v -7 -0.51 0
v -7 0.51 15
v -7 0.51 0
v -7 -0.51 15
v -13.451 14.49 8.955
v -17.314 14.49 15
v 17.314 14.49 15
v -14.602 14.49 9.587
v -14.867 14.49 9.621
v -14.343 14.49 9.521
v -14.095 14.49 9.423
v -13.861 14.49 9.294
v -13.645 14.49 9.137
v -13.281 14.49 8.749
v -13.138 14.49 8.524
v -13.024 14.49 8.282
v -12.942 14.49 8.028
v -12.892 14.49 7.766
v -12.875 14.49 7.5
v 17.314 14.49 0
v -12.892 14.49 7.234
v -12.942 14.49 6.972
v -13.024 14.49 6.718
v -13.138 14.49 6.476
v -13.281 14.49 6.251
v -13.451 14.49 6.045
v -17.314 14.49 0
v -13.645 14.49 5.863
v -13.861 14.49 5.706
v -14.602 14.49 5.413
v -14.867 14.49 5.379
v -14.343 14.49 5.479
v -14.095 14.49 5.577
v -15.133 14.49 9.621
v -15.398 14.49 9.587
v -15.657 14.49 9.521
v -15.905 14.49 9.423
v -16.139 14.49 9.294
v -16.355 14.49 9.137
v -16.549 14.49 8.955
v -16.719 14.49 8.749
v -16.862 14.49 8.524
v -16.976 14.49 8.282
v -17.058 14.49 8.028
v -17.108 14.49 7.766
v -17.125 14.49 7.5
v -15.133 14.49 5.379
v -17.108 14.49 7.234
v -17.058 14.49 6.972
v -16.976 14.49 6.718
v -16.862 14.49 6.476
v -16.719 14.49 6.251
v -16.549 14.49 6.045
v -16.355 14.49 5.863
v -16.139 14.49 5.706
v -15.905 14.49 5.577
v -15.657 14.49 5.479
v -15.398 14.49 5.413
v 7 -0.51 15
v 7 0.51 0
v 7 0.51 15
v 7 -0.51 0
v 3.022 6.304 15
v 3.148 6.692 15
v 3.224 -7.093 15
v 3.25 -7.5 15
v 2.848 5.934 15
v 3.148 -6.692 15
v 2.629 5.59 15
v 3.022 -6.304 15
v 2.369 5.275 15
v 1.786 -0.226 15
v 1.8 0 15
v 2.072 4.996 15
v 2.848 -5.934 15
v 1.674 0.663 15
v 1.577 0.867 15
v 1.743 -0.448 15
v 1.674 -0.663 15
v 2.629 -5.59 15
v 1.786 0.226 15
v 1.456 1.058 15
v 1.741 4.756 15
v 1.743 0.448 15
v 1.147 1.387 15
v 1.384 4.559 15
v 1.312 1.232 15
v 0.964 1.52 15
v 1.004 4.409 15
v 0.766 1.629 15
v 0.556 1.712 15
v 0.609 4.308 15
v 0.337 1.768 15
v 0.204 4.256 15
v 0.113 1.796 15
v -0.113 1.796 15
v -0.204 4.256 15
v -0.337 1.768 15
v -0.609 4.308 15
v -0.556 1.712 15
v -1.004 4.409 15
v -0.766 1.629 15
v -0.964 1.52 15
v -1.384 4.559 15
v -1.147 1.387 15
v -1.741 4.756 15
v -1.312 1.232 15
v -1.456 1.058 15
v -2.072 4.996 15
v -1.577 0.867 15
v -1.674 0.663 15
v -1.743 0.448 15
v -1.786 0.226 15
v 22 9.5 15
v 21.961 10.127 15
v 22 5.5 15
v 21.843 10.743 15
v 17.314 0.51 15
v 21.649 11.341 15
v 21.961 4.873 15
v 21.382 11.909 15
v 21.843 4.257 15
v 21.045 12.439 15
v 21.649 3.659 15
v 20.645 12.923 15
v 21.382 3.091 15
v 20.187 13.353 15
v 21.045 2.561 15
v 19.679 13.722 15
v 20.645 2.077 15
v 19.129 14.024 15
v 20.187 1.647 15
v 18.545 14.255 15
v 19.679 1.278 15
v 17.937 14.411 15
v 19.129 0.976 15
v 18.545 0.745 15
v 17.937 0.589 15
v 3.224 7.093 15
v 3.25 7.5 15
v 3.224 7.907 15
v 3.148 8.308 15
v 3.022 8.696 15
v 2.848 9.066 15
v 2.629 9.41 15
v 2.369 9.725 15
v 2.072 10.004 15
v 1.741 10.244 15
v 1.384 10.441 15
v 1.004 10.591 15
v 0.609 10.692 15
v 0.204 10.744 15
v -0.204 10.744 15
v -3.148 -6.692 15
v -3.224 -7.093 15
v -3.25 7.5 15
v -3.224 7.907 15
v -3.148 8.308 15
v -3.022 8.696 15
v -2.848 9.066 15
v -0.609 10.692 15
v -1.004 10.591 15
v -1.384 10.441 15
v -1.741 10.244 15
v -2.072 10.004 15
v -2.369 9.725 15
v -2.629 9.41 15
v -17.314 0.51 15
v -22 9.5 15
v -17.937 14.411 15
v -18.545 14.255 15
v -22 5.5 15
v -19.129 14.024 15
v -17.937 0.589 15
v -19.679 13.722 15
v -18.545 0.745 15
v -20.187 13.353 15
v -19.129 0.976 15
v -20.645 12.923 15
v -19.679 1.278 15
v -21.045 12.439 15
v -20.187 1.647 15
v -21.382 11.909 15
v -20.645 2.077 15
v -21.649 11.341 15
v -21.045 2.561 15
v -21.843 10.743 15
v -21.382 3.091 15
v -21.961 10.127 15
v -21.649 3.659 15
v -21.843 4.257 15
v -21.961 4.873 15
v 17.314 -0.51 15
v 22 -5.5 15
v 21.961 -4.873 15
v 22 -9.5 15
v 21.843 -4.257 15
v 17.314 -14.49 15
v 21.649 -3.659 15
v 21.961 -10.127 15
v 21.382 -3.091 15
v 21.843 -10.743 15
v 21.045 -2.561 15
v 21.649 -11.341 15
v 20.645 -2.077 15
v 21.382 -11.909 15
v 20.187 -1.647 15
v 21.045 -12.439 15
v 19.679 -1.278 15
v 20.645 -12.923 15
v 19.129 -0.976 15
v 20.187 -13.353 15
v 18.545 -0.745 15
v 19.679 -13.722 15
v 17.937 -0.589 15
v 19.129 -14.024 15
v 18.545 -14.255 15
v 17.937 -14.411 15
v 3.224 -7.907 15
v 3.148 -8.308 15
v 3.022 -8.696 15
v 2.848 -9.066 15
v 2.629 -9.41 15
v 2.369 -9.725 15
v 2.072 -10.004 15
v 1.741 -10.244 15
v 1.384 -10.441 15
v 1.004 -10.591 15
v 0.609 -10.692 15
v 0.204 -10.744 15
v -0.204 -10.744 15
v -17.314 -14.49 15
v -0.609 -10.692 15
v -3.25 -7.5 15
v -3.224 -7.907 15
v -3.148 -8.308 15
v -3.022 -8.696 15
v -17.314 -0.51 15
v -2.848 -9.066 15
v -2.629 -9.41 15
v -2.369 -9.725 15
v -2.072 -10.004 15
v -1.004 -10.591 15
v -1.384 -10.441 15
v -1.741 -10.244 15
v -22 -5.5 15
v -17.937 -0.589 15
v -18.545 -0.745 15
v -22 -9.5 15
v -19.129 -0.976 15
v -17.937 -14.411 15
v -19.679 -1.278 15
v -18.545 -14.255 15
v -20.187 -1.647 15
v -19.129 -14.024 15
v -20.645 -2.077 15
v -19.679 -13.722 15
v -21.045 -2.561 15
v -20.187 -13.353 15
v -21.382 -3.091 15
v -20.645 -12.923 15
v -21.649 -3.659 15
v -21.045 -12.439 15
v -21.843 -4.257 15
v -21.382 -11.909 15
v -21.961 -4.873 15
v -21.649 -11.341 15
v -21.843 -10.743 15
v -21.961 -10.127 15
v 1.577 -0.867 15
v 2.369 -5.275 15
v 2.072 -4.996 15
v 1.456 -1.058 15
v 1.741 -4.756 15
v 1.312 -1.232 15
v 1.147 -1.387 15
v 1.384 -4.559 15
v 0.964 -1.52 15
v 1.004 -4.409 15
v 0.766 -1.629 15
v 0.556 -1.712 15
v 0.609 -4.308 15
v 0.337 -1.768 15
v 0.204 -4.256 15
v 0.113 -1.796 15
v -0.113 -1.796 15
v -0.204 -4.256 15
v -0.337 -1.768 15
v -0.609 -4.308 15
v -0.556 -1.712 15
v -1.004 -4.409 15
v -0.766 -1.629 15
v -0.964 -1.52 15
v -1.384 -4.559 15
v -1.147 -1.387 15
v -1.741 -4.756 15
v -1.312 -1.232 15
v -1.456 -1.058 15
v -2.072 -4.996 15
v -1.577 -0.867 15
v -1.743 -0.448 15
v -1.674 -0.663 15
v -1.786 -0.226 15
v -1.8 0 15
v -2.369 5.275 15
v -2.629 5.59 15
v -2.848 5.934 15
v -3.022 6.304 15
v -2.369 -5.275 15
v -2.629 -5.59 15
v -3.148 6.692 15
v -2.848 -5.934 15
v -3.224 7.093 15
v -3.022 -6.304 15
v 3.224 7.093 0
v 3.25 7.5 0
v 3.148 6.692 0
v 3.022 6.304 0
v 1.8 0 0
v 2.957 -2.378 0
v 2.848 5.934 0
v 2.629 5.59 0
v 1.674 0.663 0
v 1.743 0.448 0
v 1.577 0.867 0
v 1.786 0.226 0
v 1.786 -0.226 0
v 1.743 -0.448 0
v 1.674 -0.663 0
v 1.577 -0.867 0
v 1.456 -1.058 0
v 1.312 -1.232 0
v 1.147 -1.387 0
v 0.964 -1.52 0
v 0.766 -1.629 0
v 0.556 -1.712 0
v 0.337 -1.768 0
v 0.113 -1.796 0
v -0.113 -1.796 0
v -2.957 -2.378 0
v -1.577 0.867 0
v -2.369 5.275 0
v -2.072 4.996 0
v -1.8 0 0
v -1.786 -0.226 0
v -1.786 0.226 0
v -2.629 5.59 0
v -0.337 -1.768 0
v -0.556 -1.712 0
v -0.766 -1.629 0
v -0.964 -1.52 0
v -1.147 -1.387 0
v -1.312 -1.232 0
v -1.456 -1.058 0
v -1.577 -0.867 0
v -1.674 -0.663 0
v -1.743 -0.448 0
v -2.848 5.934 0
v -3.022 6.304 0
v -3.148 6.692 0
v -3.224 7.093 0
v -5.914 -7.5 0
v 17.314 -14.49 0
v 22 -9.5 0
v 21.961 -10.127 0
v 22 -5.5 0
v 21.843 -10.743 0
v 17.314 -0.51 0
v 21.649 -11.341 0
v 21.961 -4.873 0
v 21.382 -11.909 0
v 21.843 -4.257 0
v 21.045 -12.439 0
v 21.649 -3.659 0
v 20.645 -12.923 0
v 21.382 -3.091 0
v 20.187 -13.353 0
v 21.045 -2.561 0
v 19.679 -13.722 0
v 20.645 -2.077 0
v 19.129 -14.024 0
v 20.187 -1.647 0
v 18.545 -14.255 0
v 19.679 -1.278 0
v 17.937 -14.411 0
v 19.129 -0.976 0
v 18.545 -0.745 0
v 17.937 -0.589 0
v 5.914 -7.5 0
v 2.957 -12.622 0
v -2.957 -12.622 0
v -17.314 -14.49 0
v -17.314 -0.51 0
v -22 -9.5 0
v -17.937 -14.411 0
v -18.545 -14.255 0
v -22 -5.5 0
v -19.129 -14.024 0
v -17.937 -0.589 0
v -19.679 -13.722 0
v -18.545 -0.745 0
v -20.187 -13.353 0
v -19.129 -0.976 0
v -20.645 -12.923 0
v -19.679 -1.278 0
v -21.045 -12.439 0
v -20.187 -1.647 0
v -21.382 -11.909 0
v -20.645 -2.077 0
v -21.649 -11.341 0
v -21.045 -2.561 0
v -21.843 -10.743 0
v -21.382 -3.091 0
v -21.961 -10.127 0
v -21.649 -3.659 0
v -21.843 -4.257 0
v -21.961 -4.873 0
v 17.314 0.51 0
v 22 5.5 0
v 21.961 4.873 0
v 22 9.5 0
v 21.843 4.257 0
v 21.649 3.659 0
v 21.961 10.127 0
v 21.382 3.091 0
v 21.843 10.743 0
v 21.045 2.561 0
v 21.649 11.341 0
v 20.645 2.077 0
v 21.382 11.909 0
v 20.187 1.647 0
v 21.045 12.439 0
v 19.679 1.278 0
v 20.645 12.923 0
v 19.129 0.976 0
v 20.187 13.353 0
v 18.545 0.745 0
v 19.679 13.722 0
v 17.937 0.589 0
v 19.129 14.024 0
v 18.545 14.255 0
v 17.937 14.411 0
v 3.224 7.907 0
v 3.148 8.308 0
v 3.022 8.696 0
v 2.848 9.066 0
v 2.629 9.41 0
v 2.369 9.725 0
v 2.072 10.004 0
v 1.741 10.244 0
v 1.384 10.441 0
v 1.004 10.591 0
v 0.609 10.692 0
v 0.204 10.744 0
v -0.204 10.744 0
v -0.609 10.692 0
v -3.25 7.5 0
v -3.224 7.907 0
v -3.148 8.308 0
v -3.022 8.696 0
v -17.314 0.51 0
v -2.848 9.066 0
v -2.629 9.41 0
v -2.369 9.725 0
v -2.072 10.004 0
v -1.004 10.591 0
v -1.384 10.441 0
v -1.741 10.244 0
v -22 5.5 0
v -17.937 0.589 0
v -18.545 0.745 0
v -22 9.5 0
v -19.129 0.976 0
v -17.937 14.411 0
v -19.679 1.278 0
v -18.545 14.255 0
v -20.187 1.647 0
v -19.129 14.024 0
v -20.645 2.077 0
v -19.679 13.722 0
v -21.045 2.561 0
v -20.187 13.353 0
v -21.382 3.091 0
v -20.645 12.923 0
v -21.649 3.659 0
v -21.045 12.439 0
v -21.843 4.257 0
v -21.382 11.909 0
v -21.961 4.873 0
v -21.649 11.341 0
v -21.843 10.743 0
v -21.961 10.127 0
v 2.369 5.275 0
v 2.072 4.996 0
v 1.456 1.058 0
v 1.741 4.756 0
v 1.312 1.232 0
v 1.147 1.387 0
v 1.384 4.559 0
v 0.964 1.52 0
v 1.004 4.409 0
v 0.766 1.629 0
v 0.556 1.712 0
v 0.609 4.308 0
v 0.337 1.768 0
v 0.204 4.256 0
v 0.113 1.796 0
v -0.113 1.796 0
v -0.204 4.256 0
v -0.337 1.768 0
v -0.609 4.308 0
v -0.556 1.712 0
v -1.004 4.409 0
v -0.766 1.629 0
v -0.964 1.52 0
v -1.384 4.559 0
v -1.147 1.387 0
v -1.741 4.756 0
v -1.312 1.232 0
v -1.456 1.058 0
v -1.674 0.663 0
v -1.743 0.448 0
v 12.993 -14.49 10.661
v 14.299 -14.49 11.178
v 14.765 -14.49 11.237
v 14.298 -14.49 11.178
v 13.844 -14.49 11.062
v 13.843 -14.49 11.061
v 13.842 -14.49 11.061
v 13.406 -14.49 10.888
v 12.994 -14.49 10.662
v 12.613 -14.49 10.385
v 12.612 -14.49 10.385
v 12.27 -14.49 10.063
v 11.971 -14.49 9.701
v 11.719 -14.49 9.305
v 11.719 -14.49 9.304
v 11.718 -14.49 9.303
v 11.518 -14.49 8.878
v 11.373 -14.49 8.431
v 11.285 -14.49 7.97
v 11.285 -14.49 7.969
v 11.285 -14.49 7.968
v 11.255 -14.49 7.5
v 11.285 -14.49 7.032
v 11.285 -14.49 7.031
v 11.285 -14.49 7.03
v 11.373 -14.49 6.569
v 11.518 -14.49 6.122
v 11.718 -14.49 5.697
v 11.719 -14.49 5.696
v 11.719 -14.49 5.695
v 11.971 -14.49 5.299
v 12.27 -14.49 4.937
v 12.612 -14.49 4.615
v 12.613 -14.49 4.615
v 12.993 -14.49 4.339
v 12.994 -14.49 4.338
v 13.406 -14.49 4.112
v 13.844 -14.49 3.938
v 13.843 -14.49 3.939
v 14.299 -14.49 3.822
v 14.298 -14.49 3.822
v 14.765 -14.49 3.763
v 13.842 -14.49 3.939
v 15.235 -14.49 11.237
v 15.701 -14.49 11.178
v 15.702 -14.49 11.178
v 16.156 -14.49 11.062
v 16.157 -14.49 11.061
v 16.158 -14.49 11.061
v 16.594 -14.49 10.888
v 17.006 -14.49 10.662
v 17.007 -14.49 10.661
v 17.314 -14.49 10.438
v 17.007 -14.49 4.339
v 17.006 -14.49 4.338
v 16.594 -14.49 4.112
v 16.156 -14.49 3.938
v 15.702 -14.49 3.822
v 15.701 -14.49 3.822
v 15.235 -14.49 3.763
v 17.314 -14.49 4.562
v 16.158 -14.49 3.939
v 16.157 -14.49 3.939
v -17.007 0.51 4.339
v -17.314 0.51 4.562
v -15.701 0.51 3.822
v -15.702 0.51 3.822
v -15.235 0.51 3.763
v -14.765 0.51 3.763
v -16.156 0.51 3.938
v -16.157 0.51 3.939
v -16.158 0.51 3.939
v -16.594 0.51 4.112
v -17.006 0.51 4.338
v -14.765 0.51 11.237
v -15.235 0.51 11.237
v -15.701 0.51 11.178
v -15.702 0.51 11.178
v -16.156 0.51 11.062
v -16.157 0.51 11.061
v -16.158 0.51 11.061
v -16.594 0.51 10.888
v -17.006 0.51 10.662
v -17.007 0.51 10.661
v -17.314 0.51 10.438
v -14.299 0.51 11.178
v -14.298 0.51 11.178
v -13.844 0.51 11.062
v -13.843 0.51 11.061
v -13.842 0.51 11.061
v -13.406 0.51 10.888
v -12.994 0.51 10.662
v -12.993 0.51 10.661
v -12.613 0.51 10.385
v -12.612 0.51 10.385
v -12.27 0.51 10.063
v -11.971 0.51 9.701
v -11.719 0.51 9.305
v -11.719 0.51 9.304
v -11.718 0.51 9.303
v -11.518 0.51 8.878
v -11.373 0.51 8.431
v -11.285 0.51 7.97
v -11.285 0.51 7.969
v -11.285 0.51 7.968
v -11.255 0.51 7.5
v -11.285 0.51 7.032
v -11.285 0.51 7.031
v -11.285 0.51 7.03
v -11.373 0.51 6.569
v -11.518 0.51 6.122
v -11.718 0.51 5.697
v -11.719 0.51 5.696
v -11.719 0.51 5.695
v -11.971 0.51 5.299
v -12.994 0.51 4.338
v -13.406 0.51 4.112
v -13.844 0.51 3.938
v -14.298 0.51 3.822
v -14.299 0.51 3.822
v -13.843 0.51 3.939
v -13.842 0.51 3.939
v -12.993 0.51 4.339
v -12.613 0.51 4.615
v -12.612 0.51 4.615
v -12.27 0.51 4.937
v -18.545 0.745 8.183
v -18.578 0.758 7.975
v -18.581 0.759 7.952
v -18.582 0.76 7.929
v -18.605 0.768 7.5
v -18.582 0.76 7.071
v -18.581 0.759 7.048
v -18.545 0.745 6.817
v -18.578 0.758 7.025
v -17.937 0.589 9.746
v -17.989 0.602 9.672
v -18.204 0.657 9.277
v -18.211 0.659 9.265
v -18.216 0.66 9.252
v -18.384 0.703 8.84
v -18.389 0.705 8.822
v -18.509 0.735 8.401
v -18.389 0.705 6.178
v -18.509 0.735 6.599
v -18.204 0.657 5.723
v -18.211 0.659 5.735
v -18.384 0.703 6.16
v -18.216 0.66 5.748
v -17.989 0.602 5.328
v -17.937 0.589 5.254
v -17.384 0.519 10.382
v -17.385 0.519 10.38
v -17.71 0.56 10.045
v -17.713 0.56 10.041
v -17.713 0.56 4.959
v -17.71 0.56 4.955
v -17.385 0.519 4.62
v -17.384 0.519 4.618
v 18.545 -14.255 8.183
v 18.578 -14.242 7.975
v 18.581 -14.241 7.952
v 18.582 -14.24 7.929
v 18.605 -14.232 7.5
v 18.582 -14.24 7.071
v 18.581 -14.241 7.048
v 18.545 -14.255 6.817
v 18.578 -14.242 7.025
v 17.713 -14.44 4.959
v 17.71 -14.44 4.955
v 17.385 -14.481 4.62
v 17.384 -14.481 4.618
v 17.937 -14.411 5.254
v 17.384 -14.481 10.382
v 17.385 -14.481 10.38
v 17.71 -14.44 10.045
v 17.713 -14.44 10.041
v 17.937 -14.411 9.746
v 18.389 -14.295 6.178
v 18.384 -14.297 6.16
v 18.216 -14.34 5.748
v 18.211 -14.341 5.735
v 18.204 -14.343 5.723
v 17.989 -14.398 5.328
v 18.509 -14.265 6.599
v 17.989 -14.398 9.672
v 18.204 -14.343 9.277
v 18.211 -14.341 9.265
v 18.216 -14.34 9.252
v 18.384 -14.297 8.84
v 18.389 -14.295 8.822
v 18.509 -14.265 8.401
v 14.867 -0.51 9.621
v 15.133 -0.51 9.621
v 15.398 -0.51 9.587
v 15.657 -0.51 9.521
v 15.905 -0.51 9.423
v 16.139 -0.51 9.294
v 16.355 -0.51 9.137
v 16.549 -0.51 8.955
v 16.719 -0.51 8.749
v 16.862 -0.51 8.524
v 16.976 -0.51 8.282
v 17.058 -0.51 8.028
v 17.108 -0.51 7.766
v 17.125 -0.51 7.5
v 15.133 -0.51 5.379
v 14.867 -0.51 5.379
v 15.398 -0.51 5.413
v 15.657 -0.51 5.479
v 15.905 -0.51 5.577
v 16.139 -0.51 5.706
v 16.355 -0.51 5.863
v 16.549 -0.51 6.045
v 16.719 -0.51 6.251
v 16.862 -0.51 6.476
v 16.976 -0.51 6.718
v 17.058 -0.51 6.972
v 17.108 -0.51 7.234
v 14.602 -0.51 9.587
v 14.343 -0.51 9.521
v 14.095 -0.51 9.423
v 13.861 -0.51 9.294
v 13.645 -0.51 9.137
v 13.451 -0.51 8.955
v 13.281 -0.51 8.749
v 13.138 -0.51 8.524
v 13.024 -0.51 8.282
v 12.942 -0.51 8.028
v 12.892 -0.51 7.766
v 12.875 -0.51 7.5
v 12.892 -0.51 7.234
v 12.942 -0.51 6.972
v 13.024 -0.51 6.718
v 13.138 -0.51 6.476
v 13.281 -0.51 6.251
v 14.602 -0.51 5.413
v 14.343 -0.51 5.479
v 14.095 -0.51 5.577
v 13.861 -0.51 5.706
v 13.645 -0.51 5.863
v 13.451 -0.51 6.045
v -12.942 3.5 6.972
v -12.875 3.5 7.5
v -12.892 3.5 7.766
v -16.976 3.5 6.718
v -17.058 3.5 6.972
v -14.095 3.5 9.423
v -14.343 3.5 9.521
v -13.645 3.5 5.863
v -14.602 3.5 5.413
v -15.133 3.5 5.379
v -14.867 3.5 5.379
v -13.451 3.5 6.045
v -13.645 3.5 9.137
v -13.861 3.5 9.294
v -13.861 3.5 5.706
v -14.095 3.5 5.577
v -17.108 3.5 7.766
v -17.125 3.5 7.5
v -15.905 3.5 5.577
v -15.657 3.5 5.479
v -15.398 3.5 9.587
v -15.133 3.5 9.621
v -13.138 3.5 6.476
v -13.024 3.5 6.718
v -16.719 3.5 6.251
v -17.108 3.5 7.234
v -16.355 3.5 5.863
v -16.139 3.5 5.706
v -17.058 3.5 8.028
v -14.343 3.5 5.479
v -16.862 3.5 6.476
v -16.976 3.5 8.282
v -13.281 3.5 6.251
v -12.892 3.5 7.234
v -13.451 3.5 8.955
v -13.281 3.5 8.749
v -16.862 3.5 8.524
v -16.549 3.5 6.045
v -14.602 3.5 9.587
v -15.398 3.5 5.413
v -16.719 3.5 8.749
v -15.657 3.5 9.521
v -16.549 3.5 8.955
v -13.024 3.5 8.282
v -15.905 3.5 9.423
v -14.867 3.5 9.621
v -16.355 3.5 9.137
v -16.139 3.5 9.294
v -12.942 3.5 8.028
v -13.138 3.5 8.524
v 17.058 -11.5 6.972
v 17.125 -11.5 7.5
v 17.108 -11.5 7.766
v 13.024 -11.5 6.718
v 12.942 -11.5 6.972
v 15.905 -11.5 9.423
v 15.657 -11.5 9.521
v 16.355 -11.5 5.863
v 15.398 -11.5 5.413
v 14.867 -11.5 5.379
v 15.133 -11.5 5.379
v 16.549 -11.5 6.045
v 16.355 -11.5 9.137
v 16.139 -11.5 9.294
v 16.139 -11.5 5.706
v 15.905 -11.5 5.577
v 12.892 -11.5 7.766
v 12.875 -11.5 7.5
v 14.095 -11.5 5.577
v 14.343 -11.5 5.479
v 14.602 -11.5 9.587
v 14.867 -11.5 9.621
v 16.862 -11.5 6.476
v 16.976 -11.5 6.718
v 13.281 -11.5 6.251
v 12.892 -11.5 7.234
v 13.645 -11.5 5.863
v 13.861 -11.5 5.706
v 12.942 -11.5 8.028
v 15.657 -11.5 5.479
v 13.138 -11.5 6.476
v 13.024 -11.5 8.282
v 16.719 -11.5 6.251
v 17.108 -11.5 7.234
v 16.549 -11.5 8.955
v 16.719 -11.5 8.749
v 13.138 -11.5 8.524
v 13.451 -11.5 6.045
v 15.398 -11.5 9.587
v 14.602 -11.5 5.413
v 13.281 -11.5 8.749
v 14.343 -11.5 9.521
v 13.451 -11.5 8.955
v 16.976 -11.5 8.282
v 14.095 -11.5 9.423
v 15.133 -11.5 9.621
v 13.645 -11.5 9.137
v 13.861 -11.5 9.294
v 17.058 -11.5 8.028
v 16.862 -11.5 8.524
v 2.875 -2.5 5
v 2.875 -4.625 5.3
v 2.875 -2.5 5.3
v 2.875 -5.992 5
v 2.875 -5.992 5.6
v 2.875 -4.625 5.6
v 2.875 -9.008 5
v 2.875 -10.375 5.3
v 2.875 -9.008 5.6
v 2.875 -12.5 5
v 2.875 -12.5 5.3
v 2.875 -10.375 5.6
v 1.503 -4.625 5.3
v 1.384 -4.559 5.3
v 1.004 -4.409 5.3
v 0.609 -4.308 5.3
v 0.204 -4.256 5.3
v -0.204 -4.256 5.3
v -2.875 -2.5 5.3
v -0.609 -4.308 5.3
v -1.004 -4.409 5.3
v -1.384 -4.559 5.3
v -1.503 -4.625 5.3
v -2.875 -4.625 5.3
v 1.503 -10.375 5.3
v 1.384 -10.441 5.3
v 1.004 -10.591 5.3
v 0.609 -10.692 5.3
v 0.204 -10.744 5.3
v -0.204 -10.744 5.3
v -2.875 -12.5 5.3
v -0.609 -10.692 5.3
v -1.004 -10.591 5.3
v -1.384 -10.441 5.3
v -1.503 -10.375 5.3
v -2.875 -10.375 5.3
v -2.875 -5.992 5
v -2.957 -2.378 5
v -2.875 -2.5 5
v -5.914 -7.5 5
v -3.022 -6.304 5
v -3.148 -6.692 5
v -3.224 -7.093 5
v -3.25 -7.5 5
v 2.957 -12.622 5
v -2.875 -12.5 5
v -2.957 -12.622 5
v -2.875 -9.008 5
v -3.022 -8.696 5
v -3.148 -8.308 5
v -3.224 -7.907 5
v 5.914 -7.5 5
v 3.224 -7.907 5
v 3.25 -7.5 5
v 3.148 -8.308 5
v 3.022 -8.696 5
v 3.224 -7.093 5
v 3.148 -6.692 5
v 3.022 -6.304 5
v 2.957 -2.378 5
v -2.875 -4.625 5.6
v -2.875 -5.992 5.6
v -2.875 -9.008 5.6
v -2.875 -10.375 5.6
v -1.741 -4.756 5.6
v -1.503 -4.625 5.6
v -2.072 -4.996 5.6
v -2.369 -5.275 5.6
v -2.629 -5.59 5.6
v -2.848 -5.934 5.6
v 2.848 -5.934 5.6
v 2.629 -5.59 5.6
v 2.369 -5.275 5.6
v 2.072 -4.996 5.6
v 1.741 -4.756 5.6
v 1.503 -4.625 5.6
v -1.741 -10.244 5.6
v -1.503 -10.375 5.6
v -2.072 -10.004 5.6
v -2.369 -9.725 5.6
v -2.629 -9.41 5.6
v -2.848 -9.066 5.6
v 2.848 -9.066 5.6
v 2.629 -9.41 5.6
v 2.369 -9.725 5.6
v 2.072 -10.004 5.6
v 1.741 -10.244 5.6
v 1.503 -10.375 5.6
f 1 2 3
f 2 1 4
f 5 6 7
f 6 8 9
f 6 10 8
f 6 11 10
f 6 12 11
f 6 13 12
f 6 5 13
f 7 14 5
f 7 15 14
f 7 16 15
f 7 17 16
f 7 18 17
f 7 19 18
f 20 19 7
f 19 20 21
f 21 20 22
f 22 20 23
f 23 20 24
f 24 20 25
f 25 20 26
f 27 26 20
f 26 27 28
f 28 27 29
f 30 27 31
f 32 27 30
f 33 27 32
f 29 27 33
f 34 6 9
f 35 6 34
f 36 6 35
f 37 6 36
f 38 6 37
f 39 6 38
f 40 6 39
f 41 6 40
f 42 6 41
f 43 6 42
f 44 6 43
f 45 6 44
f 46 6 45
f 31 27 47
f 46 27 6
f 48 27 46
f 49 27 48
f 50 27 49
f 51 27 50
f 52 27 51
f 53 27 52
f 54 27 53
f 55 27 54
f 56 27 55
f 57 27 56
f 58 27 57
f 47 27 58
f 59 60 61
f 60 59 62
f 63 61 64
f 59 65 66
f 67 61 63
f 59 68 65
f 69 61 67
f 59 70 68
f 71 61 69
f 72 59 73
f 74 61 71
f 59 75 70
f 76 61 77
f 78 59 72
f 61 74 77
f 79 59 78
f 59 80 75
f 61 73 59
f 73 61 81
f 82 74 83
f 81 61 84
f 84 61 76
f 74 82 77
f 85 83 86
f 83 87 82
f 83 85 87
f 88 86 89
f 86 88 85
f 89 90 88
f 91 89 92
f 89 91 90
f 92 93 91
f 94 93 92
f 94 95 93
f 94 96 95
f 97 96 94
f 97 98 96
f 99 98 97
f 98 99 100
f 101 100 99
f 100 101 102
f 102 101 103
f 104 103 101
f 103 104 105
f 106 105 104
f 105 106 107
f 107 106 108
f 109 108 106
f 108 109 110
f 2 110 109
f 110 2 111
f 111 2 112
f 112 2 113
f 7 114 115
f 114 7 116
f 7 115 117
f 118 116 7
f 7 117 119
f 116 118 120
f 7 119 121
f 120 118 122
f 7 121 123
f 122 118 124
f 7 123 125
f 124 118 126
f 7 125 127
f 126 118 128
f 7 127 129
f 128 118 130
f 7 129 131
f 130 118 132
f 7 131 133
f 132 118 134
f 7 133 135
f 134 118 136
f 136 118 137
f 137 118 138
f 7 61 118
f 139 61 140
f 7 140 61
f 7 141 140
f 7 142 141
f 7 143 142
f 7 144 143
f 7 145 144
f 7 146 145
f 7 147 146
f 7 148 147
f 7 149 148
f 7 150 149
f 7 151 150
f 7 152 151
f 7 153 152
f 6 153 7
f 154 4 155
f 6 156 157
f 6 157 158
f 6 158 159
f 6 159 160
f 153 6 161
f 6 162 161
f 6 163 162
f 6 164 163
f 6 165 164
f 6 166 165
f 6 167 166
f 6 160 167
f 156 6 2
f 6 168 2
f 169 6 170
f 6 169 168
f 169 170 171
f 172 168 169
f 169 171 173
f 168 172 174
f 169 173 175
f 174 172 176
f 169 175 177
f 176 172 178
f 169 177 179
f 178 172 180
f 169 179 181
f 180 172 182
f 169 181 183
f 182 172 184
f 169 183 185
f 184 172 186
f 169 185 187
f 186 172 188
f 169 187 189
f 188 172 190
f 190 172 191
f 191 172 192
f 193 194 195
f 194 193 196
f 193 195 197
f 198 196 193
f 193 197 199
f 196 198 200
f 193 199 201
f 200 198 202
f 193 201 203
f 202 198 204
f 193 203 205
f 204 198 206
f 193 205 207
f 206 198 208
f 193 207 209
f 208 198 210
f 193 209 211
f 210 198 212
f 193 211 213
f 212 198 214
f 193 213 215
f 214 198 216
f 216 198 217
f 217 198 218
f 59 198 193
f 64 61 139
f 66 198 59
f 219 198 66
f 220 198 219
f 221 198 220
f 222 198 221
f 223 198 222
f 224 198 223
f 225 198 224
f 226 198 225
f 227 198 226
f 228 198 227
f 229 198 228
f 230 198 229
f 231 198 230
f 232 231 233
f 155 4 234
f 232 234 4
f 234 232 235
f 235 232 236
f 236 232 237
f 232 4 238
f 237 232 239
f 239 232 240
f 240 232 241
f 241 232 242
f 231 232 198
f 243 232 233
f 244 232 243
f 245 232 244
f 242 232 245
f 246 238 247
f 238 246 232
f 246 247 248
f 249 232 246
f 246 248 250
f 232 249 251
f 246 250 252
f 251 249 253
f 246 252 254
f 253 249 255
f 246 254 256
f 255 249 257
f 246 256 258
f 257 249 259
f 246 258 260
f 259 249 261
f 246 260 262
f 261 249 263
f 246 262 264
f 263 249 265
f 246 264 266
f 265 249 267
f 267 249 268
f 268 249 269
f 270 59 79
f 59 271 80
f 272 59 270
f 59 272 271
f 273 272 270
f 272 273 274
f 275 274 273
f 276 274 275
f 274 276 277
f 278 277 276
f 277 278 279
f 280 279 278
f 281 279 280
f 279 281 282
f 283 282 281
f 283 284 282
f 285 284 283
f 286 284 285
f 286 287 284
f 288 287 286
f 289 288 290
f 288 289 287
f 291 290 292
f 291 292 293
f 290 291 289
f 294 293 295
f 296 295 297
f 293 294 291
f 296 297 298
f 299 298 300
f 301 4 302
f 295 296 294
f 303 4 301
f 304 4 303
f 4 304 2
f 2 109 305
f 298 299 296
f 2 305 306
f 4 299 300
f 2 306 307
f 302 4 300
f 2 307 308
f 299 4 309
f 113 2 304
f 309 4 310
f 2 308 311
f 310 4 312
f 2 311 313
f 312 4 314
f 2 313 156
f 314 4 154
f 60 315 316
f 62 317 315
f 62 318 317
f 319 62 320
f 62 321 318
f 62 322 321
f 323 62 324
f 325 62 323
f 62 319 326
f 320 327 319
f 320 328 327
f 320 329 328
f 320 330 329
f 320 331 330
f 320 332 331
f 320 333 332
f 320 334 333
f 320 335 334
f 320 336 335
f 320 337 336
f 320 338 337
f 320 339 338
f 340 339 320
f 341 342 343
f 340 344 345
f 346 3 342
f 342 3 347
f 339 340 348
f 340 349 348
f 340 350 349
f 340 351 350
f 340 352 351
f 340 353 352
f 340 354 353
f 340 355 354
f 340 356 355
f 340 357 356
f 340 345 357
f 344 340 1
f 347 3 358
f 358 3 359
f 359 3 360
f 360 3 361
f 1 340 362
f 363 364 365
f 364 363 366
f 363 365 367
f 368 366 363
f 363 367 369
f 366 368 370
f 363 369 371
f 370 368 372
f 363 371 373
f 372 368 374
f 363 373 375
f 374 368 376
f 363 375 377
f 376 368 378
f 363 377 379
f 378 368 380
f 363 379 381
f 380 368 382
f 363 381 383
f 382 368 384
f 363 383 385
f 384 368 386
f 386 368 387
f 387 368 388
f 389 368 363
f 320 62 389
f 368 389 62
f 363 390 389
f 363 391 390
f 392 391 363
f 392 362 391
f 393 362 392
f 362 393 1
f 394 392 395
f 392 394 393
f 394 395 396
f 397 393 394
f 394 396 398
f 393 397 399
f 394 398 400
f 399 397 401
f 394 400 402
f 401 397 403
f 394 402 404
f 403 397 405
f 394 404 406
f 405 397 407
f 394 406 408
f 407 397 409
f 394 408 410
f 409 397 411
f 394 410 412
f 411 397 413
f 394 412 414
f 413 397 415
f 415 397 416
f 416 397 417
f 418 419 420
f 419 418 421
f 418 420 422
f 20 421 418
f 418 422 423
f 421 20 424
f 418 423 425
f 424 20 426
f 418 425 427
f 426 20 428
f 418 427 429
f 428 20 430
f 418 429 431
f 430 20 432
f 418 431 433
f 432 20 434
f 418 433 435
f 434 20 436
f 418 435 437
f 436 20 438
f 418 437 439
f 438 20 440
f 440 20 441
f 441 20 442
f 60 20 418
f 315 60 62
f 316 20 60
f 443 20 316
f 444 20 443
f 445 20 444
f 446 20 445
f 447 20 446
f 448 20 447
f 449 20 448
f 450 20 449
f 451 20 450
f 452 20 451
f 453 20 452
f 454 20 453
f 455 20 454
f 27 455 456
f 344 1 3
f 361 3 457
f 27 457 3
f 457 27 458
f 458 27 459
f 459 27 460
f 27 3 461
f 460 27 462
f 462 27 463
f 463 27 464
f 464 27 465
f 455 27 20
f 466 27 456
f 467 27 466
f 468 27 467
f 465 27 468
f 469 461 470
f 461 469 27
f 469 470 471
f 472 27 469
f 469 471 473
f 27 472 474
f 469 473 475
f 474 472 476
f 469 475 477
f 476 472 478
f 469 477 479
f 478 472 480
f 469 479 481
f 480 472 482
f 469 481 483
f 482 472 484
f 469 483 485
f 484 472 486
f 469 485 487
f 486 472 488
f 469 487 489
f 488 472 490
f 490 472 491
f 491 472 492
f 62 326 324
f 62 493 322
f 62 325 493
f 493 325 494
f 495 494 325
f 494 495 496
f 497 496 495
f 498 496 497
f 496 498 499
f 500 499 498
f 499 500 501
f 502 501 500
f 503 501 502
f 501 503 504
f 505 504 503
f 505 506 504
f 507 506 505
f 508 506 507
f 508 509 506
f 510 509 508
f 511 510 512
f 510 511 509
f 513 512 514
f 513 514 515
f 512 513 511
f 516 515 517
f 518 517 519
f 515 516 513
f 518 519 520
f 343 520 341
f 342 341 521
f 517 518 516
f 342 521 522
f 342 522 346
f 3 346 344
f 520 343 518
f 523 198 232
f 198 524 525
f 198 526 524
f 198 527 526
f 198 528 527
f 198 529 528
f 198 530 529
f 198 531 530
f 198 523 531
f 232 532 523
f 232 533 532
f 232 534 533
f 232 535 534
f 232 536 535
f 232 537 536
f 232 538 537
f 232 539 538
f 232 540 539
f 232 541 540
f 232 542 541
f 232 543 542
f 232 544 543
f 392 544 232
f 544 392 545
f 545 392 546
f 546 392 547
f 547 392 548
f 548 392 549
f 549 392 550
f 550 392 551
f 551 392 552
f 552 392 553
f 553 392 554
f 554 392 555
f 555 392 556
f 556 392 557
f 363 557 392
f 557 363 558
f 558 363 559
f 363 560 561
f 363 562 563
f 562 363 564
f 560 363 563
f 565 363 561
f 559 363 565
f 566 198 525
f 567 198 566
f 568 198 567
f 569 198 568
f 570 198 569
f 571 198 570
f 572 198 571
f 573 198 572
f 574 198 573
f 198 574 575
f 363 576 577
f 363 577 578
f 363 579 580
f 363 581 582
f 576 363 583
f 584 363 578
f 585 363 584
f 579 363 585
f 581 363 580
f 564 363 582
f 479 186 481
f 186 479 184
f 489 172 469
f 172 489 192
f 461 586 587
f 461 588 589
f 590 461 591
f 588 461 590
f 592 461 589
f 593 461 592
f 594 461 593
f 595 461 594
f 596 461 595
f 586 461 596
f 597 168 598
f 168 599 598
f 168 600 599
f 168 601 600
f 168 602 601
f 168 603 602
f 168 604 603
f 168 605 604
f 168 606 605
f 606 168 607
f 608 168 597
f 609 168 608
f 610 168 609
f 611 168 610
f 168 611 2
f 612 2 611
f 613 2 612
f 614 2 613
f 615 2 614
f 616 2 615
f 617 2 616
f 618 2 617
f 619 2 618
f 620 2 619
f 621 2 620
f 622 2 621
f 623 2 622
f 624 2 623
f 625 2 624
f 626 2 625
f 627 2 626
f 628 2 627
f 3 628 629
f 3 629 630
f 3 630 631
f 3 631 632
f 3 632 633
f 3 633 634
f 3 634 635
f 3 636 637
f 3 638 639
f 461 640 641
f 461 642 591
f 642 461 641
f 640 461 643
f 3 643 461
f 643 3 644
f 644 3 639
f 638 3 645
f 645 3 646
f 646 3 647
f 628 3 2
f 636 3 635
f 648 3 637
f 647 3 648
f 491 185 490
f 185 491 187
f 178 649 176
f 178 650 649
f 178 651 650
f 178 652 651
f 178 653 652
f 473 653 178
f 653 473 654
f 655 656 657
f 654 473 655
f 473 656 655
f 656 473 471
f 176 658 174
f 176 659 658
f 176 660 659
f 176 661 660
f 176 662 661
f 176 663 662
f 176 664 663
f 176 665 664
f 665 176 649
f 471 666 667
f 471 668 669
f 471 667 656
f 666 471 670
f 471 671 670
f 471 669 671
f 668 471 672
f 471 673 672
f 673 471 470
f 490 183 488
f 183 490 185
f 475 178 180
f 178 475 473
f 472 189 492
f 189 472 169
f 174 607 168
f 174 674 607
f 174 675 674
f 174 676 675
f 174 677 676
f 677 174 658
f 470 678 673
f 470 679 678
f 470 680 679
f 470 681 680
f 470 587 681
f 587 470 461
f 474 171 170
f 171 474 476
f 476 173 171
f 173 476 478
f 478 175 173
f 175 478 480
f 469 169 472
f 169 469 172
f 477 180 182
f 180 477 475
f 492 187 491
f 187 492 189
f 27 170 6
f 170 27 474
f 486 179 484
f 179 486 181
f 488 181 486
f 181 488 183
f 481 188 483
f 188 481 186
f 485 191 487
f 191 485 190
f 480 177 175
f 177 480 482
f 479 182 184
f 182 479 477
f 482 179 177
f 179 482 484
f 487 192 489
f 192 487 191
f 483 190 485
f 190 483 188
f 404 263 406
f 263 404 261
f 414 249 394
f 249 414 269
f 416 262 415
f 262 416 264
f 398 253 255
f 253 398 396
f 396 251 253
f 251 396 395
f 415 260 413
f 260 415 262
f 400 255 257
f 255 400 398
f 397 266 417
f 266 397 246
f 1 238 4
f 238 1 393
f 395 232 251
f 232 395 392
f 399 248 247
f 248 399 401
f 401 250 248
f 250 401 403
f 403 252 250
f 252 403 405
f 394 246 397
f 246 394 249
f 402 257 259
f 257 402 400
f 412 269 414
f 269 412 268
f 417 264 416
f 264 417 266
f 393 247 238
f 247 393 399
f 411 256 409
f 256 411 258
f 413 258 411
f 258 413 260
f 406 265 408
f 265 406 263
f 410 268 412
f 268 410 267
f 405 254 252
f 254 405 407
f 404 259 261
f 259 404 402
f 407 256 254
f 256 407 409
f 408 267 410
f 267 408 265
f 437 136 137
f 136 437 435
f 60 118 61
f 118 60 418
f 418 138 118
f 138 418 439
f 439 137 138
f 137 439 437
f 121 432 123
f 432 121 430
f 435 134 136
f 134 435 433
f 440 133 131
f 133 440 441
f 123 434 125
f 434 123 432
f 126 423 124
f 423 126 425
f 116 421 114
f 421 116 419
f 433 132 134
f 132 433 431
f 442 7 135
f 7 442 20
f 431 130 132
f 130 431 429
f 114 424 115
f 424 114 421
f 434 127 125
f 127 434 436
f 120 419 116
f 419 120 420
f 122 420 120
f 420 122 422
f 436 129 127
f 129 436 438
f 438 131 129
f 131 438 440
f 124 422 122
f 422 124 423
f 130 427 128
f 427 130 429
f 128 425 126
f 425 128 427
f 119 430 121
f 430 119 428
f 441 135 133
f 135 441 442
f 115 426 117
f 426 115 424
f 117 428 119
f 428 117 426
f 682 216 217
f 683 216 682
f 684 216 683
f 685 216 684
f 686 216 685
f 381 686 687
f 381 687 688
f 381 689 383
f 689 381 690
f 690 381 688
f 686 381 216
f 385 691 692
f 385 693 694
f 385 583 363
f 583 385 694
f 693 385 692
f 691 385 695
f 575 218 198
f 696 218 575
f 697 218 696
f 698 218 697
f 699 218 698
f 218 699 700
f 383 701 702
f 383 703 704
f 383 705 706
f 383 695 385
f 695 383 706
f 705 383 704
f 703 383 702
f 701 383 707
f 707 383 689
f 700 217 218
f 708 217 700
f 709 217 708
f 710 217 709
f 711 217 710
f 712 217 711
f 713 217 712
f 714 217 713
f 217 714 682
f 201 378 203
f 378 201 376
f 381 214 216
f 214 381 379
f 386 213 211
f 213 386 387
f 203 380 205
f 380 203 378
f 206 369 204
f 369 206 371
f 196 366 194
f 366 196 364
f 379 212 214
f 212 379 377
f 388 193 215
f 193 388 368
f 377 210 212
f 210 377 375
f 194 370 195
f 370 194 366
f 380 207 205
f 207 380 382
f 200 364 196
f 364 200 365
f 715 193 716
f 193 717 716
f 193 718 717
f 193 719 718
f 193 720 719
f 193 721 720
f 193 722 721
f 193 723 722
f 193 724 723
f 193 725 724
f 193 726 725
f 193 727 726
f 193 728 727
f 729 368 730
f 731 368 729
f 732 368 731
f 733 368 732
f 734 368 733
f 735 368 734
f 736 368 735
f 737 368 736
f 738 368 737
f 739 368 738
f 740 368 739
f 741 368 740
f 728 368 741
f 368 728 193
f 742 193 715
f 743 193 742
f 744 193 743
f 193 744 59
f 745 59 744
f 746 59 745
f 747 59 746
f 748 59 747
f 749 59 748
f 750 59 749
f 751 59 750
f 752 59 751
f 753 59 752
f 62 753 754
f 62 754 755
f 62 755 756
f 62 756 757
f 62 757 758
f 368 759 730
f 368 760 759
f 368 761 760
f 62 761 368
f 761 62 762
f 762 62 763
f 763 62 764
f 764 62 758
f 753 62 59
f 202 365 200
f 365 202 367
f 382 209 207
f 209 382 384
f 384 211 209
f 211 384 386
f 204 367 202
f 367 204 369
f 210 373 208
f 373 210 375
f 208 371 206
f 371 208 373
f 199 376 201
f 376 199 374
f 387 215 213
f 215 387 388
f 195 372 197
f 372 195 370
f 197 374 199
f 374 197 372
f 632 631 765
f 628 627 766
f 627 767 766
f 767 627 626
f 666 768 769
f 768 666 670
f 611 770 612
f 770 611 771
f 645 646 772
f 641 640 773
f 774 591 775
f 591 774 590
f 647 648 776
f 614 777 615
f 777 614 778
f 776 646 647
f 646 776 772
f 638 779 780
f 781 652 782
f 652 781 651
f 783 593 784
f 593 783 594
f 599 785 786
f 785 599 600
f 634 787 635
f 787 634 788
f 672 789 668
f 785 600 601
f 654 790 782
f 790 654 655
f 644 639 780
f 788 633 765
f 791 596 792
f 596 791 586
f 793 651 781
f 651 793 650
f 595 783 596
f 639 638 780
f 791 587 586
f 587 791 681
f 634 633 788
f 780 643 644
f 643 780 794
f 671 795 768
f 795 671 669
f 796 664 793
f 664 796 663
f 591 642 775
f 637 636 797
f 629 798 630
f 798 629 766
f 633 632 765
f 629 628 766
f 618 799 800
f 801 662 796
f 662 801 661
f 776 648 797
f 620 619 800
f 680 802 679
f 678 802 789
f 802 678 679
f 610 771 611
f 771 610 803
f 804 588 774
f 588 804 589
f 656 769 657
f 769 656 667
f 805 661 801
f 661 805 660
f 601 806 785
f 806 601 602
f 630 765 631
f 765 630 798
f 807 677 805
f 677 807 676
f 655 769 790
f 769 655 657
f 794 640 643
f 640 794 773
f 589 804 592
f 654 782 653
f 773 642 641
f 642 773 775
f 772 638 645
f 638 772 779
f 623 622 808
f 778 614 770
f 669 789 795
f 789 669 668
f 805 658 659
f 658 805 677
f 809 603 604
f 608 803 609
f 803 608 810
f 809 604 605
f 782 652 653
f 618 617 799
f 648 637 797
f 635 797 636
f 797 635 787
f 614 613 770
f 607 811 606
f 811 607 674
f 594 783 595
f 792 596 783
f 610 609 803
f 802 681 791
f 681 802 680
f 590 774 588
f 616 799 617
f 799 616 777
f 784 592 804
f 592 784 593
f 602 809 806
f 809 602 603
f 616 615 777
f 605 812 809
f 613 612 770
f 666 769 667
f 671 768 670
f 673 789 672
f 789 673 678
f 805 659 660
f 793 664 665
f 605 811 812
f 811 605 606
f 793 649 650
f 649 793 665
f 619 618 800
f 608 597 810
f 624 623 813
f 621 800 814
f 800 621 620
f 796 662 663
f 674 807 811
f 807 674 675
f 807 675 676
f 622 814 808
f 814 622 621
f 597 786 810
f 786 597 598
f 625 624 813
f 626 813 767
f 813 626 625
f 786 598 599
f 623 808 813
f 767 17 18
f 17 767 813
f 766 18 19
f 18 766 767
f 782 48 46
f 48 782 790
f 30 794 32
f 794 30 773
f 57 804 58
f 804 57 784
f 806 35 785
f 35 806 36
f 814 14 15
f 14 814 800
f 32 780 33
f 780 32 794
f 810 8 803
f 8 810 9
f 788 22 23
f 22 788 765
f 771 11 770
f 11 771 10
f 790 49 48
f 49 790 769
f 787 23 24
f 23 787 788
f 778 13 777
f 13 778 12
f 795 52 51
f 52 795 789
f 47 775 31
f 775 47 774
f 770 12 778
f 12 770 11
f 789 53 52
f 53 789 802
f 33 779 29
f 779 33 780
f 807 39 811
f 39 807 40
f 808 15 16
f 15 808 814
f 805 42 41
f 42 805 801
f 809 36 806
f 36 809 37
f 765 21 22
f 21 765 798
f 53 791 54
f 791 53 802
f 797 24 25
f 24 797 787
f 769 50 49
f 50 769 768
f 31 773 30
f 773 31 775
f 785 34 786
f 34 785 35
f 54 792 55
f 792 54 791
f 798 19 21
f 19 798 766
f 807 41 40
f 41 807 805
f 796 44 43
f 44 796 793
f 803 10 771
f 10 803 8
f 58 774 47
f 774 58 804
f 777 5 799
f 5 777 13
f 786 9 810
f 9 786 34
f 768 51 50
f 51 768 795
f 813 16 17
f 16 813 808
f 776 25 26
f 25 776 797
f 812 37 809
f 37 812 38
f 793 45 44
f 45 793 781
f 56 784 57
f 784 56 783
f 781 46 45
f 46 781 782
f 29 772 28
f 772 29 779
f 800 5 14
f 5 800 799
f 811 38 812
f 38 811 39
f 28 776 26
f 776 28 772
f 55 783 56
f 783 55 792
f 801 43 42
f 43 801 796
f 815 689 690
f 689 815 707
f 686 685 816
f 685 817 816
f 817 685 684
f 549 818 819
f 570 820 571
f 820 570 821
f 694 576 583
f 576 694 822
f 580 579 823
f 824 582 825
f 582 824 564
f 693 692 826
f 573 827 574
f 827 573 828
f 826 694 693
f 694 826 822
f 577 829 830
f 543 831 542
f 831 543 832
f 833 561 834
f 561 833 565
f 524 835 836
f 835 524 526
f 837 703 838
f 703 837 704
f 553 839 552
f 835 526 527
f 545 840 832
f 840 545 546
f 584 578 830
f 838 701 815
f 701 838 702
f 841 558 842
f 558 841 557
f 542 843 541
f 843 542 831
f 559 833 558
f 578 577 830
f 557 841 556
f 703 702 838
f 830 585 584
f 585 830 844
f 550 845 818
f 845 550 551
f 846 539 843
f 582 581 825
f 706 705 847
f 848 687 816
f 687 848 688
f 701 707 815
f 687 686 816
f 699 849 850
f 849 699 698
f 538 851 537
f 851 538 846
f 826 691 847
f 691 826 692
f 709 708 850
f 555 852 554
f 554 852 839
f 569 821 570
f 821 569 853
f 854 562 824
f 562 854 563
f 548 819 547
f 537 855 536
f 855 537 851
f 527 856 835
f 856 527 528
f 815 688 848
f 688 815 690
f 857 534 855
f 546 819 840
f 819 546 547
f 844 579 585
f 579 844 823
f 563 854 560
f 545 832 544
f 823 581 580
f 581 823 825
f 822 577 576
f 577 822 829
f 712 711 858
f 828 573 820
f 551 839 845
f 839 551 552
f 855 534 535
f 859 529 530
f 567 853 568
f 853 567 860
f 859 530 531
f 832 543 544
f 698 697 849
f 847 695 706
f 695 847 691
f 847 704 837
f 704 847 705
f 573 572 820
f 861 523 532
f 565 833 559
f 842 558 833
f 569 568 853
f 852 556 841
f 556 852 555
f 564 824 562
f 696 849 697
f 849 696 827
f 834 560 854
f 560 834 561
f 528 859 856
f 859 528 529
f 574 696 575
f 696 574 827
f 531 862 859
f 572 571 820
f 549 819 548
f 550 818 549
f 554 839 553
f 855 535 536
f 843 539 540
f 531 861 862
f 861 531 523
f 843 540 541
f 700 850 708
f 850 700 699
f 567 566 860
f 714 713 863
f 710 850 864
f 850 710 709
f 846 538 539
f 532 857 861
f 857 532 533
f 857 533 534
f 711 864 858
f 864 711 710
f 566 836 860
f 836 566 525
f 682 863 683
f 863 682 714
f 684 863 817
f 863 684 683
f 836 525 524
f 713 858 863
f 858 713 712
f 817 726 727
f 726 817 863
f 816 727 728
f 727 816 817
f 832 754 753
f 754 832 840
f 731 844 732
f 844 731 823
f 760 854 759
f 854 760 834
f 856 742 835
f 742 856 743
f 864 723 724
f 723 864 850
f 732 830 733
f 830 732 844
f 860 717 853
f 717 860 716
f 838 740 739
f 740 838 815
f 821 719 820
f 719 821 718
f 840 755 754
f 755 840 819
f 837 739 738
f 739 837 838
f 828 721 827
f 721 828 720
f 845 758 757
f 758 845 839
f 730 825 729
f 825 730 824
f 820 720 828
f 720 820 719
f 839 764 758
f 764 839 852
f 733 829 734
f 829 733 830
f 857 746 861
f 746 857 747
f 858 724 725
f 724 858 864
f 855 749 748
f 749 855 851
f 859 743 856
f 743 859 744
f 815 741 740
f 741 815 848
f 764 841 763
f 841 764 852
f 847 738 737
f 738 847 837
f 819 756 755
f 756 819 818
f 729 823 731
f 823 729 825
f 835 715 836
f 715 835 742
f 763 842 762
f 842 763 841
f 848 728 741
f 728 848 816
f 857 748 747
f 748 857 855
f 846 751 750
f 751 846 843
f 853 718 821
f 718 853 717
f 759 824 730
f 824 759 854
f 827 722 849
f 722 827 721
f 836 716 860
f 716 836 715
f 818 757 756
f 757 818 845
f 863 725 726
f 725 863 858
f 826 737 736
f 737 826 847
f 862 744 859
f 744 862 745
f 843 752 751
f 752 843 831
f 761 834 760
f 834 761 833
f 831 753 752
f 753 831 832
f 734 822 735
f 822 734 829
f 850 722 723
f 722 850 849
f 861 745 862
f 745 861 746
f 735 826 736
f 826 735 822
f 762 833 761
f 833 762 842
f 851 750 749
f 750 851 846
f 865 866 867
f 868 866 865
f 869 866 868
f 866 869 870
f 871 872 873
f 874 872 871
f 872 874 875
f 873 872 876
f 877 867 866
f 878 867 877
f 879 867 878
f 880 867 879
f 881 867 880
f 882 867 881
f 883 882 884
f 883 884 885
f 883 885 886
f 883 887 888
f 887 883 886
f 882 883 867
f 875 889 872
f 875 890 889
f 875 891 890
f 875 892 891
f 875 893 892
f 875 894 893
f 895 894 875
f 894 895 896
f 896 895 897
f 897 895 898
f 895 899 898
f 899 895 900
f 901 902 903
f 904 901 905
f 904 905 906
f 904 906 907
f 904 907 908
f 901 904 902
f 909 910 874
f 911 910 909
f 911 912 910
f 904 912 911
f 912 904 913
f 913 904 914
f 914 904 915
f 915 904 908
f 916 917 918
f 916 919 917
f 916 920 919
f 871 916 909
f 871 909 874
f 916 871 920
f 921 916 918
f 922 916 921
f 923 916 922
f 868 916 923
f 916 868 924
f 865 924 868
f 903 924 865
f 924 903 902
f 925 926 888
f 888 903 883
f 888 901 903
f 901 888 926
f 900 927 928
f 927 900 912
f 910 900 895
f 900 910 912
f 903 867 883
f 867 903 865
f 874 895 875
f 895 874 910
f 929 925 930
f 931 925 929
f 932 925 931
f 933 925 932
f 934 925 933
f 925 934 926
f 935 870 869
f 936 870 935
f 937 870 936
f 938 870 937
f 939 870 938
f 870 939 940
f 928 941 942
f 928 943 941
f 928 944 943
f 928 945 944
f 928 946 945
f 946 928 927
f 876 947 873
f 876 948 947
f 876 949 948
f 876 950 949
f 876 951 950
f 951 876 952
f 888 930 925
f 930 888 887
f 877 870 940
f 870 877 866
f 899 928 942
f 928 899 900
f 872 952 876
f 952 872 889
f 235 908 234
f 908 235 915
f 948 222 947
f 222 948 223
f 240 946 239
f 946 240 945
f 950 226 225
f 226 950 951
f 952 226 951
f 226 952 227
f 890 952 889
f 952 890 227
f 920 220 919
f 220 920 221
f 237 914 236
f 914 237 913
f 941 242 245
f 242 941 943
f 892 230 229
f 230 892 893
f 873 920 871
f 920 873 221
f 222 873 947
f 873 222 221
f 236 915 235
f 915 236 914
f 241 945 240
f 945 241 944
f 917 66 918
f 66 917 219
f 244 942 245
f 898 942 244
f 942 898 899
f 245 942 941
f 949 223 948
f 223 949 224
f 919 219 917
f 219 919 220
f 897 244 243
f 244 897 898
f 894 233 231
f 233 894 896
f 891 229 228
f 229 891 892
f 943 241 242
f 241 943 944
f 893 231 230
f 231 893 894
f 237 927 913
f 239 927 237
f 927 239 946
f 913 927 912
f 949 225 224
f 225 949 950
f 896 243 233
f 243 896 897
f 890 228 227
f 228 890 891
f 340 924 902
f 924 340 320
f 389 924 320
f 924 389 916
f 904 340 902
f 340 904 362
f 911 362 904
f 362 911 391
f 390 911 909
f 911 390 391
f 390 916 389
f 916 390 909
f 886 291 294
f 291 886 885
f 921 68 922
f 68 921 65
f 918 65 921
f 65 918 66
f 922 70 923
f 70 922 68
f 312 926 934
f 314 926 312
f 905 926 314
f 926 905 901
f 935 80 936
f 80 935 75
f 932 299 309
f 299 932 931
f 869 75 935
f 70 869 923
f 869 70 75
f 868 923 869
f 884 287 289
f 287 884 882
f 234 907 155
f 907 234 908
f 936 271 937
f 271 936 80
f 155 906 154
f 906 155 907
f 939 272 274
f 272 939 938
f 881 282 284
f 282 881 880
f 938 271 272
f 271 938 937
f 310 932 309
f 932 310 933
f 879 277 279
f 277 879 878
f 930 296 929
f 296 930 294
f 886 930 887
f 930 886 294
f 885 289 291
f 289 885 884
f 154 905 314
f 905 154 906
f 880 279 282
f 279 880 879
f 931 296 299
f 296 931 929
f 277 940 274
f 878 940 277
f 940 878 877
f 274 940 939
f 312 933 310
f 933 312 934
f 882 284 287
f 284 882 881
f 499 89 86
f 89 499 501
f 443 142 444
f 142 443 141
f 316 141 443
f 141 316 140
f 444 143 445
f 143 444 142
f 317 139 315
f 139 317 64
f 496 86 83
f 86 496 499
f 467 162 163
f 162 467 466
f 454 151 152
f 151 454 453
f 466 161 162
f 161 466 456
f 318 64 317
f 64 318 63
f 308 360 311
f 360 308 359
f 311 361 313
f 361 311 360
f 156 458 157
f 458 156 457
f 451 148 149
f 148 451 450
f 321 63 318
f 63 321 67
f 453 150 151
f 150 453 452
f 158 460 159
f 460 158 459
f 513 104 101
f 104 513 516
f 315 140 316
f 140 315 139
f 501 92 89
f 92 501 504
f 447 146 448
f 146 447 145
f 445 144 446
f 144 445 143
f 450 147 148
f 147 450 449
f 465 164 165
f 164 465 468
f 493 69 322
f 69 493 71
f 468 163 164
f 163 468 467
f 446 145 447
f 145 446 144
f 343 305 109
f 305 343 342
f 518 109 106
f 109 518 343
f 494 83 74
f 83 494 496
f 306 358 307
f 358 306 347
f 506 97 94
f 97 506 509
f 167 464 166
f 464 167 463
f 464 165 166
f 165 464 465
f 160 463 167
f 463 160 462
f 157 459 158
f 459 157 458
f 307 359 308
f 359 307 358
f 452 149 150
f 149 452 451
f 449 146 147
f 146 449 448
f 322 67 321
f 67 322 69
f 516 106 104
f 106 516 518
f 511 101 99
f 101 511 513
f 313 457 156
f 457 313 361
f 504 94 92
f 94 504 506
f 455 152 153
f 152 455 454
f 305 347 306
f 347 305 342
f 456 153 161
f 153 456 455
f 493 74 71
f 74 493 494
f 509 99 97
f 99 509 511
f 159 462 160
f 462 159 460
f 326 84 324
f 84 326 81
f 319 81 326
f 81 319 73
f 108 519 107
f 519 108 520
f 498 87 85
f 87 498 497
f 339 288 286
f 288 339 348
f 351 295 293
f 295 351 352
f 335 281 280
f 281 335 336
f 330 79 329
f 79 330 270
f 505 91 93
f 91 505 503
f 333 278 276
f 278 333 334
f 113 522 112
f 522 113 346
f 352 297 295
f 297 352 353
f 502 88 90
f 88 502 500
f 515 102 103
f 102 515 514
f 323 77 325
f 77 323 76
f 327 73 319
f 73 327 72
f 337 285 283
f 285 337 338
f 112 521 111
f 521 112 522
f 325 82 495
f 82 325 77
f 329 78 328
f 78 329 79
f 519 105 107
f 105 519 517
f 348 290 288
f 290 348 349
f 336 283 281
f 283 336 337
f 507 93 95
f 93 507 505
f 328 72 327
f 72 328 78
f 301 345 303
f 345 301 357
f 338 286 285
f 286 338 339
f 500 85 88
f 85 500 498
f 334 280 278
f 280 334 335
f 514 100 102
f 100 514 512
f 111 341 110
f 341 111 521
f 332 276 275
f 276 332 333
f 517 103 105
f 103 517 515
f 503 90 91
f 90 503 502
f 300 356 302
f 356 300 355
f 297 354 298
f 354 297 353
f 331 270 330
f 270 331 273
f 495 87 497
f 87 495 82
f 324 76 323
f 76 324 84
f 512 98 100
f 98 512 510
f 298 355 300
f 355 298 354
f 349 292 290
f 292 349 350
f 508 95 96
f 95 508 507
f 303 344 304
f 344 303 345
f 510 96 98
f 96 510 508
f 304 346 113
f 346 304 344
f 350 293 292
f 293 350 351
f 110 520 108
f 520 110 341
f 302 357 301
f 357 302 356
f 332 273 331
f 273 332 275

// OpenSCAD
$fn = 50;


difference() {
	union() {
		hull() {
			translate(v = [-2.0000000000, 9.5000000000, 0]) {
				cylinder(h = 15, r = 5);
			}
			translate(v = [2.0000000000, 9.5000000000, 0]) {
				cylinder(h = 15, r = 5);
			}
			translate(v = [-2.0000000000, -9.5000000000, 0]) {
				cylinder(h = 15, r = 5);
			}
			translate(v = [2.0000000000, -9.5000000000, 0]) {
				cylinder(h = 15, r = 5);
			}
		}
		translate(v = [-7.5000000000, 7.5000000000, 0]) {
			hull() {
				translate(v = [-9.5000000000, 2.0000000000, 0]) {
					cylinder(h = 15, r = 5);
				}
				translate(v = [9.5000000000, 2.0000000000, 0]) {
					cylinder(h = 15, r = 5);
				}
				translate(v = [-9.5000000000, -2.0000000000, 0]) {
					cylinder(h = 15, r = 5);
				}
				translate(v = [9.5000000000, -2.0000000000, 0]) {
					cylinder(h = 15, r = 5);
				}
			}
		}
		translate(v = [-7.5000000000, -7.5000000000, 0]) {
			hull() {
				translate(v = [-9.5000000000, 2.0000000000, 0]) {
					cylinder(h = 15, r = 5);
				}
				translate(v = [9.5000000000, 2.0000000000, 0]) {
					cylinder(h = 15, r = 5);
				}
				translate(v = [-9.5000000000, -2.0000000000, 0]) {
					cylinder(h = 15, r = 5);
				}
				translate(v = [9.5000000000, -2.0000000000, 0]) {
					cylinder(h = 15, r = 5);
				}
			}
		}
		translate(v = [7.5000000000, 7.5000000000, 0]) {
			hull() {
				translate(v = [-9.5000000000, 2.0000000000, 0]) {
					cylinder(h = 15, r = 5);
				}
				translate(v = [9.5000000000, 2.0000000000, 0]) {
					cylinder(h = 15, r = 5);
				}
				translate(v = [-9.5000000000, -2.0000000000, 0]) {
					cylinder(h = 15, r = 5);
				}
				translate(v = [9.5000000000, -2.0000000000, 0]) {
					cylinder(h = 15, r = 5);
				}
			}
		}
		translate(v = [7.5000000000, -7.5000000000, 0]) {
			hull() {
				translate(v = [-9.5000000000, 2.0000000000, 0]) {
					cylinder(h = 15, r = 5);
				}
				translate(v = [9.5000000000, 2.0000000000, 0]) {
					cylinder(h = 15, r = 5);
				}
				translate(v = [-9.5000000000, -2.0000000000, 0]) {
					cylinder(h = 15, r = 5);
				}
				translate(v = [9.5000000000, -2.0000000000, 0]) {
					cylinder(h = 15, r = 5);
				}
			}
		}
	}
	union() {
		translate(v = [-15.0000000000, 0.5000000000, 7.5000000000]) {
			rotate(a = [90, 0, 0]) {
				difference() {
					union() {
						#translate(v = [0, 0, -14.0000000000]) {
							cylinder(h = 14, r = 2.0000000000);
						}
						#translate(v = [0, 0, -3]) {
							cylinder(h = 3, r1 = 2.1250000000, r2 = 3.7500000000);
						}
						#translate(v = [0, 0, -14.0000000000]) {
							cylinder(h = 14, r = 2.1250000000);
						}
						#translate(v = [0, 0, -14.0000000000]) {
							cylinder(h = 14, r = 2.0000000000);
						}
					}
					union();
				}
			}
		}
		translate(v = [15.0000000000, -14.5000000000, 7.5000000000]) {
			rotate(a = [90, 0, 0]) {
				difference() {
					union() {
						#translate(v = [0, 0, -14.0000000000]) {
							cylinder(h = 14, r = 2.0000000000);
						}
						#translate(v = [0, 0, -3]) {
							cylinder(h = 3, r1 = 2.1250000000, r2 = 3.7500000000);
						}
						#translate(v = [0, 0, -14.0000000000]) {
							cylinder(h = 14, r = 2.1250000000);
						}
						#translate(v = [0, 0, -14.0000000000]) {
							cylinder(h = 14, r = 2.0000000000);
						}
					}
					union();
				}
			}
		}
		translate(v = [0.0000000000, -7.5000000000, 0]) {
			rotate(a = [0, 0, 0]) {
				difference() {
					union() {
						#translate(v = [-2.8750000000, -5.0000000000, -0.3000000000]) {
							cube(size = [5.7500000000, 10, 0.3000000000]);
						}
						#translate(v = [-2.8750000000, -2.8750000000, -0.6000000000]) {
							cube(size = [5.7500000000, 5.7500000000, 0.3000000000]);
						}
						#translate(v = [-2.8750000000, -5.0000000000, 5]) {
							cube(size = [5.7500000000, 10, 0.3000000000]);
						}
						#translate(v = [-2.8750000000, -2.8750000000, 5.3000000000]) {
							cube(size = [5.7500000000, 5.7500000000, 0.3000000000]);
						}
						#translate(v = [0, 0, -100.0000000000]) {
							cylinder(h = 200, r = 3.2500000000);
						}
						#linear_extrude(height = 5) {
							polygon(points = [[5.9142500000, 0.0000000000], [2.9571250000, 5.1218907443], [-2.9571250000, 5.1218907443], [-5.9142500000, 0.0000000000], [-2.9571250000, -5.1218907443], [2.9571250000, -5.1218907443]]);
						}
						#translate(v = [-2.8750000000, -5.0000000000, -0.3000000000]) {
							cube(size = [5.7500000000, 10, 0.3000000000]);
						}
						#translate(v = [-2.8750000000, -2.8750000000, -0.6000000000]) {
							cube(size = [5.7500000000, 5.7500000000, 0.3000000000]);
						}
						#translate(v = [-2.8750000000, -5.0000000000, 5]) {
							cube(size = [5.7500000000, 10, 0.3000000000]);
						}
						#translate(v = [-2.8750000000, -2.8750000000, 5.3000000000]) {
							cube(size = [5.7500000000, 5.7500000000, 0.3000000000]);
						}
						#translate(v = [0, 0, -100.0000000000]) {
							cylinder(h = 200, r = 3.2500000000);
						}
						#translate(v = [-2.8750000000, -5.0000000000, -0.3000000000]) {
							cube(size = [5.7500000000, 10, 0.3000000000]);
						}
						#translate(v = [-2.8750000000, -2.8750000000, -0.6000000000]) {
							cube(size = [5.7500000000, 5.7500000000, 0.3000000000]);
						}
						#translate(v = [-2.8750000000, -5.0000000000, 5]) {
							cube(size = [5.7500000000, 10, 0.3000000000]);
						}
						#translate(v = [-2.8750000000, -2.8750000000, 5.3000000000]) {
							cube(size = [5.7500000000, 5.7500000000, 0.3000000000]);
						}
						#translate(v = [0, 0, -100.0000000000]) {
							cylinder(h = 200, r = 3.2500000000);
						}
					}
					union();
				}
			}
		}
		translate(v = [0.0000000000, -7.5000000000, 0]) {
			translate(v = [0, 0, -100]) {
				cylinder(h = 200, r = 3.2500000000);
			}
		}
		translate(v = [0.0000000000, 7.5000000000, 0]) {
			translate(v = [0, 0, -100]) {
				cylinder(h = 200, r = 3.2500000000);
			}
		}
		translate(v = [0.0000000000, -7.5000000000, 0]) {
			translate(v = [0, 0, -100]) {
				cylinder(h = 200, r = 1.8000000000);
			}
		}
		translate(v = [0, 0, -100]) {
			cylinder(h = 200, r = 1.8000000000);
		}
		translate(v = [0.0000000000, 7.5000000000, 0]) {
			translate(v = [0, 0, -100]) {
				cylinder(h = 200, r = 1.8000000000);
			}
		}
	}
}
